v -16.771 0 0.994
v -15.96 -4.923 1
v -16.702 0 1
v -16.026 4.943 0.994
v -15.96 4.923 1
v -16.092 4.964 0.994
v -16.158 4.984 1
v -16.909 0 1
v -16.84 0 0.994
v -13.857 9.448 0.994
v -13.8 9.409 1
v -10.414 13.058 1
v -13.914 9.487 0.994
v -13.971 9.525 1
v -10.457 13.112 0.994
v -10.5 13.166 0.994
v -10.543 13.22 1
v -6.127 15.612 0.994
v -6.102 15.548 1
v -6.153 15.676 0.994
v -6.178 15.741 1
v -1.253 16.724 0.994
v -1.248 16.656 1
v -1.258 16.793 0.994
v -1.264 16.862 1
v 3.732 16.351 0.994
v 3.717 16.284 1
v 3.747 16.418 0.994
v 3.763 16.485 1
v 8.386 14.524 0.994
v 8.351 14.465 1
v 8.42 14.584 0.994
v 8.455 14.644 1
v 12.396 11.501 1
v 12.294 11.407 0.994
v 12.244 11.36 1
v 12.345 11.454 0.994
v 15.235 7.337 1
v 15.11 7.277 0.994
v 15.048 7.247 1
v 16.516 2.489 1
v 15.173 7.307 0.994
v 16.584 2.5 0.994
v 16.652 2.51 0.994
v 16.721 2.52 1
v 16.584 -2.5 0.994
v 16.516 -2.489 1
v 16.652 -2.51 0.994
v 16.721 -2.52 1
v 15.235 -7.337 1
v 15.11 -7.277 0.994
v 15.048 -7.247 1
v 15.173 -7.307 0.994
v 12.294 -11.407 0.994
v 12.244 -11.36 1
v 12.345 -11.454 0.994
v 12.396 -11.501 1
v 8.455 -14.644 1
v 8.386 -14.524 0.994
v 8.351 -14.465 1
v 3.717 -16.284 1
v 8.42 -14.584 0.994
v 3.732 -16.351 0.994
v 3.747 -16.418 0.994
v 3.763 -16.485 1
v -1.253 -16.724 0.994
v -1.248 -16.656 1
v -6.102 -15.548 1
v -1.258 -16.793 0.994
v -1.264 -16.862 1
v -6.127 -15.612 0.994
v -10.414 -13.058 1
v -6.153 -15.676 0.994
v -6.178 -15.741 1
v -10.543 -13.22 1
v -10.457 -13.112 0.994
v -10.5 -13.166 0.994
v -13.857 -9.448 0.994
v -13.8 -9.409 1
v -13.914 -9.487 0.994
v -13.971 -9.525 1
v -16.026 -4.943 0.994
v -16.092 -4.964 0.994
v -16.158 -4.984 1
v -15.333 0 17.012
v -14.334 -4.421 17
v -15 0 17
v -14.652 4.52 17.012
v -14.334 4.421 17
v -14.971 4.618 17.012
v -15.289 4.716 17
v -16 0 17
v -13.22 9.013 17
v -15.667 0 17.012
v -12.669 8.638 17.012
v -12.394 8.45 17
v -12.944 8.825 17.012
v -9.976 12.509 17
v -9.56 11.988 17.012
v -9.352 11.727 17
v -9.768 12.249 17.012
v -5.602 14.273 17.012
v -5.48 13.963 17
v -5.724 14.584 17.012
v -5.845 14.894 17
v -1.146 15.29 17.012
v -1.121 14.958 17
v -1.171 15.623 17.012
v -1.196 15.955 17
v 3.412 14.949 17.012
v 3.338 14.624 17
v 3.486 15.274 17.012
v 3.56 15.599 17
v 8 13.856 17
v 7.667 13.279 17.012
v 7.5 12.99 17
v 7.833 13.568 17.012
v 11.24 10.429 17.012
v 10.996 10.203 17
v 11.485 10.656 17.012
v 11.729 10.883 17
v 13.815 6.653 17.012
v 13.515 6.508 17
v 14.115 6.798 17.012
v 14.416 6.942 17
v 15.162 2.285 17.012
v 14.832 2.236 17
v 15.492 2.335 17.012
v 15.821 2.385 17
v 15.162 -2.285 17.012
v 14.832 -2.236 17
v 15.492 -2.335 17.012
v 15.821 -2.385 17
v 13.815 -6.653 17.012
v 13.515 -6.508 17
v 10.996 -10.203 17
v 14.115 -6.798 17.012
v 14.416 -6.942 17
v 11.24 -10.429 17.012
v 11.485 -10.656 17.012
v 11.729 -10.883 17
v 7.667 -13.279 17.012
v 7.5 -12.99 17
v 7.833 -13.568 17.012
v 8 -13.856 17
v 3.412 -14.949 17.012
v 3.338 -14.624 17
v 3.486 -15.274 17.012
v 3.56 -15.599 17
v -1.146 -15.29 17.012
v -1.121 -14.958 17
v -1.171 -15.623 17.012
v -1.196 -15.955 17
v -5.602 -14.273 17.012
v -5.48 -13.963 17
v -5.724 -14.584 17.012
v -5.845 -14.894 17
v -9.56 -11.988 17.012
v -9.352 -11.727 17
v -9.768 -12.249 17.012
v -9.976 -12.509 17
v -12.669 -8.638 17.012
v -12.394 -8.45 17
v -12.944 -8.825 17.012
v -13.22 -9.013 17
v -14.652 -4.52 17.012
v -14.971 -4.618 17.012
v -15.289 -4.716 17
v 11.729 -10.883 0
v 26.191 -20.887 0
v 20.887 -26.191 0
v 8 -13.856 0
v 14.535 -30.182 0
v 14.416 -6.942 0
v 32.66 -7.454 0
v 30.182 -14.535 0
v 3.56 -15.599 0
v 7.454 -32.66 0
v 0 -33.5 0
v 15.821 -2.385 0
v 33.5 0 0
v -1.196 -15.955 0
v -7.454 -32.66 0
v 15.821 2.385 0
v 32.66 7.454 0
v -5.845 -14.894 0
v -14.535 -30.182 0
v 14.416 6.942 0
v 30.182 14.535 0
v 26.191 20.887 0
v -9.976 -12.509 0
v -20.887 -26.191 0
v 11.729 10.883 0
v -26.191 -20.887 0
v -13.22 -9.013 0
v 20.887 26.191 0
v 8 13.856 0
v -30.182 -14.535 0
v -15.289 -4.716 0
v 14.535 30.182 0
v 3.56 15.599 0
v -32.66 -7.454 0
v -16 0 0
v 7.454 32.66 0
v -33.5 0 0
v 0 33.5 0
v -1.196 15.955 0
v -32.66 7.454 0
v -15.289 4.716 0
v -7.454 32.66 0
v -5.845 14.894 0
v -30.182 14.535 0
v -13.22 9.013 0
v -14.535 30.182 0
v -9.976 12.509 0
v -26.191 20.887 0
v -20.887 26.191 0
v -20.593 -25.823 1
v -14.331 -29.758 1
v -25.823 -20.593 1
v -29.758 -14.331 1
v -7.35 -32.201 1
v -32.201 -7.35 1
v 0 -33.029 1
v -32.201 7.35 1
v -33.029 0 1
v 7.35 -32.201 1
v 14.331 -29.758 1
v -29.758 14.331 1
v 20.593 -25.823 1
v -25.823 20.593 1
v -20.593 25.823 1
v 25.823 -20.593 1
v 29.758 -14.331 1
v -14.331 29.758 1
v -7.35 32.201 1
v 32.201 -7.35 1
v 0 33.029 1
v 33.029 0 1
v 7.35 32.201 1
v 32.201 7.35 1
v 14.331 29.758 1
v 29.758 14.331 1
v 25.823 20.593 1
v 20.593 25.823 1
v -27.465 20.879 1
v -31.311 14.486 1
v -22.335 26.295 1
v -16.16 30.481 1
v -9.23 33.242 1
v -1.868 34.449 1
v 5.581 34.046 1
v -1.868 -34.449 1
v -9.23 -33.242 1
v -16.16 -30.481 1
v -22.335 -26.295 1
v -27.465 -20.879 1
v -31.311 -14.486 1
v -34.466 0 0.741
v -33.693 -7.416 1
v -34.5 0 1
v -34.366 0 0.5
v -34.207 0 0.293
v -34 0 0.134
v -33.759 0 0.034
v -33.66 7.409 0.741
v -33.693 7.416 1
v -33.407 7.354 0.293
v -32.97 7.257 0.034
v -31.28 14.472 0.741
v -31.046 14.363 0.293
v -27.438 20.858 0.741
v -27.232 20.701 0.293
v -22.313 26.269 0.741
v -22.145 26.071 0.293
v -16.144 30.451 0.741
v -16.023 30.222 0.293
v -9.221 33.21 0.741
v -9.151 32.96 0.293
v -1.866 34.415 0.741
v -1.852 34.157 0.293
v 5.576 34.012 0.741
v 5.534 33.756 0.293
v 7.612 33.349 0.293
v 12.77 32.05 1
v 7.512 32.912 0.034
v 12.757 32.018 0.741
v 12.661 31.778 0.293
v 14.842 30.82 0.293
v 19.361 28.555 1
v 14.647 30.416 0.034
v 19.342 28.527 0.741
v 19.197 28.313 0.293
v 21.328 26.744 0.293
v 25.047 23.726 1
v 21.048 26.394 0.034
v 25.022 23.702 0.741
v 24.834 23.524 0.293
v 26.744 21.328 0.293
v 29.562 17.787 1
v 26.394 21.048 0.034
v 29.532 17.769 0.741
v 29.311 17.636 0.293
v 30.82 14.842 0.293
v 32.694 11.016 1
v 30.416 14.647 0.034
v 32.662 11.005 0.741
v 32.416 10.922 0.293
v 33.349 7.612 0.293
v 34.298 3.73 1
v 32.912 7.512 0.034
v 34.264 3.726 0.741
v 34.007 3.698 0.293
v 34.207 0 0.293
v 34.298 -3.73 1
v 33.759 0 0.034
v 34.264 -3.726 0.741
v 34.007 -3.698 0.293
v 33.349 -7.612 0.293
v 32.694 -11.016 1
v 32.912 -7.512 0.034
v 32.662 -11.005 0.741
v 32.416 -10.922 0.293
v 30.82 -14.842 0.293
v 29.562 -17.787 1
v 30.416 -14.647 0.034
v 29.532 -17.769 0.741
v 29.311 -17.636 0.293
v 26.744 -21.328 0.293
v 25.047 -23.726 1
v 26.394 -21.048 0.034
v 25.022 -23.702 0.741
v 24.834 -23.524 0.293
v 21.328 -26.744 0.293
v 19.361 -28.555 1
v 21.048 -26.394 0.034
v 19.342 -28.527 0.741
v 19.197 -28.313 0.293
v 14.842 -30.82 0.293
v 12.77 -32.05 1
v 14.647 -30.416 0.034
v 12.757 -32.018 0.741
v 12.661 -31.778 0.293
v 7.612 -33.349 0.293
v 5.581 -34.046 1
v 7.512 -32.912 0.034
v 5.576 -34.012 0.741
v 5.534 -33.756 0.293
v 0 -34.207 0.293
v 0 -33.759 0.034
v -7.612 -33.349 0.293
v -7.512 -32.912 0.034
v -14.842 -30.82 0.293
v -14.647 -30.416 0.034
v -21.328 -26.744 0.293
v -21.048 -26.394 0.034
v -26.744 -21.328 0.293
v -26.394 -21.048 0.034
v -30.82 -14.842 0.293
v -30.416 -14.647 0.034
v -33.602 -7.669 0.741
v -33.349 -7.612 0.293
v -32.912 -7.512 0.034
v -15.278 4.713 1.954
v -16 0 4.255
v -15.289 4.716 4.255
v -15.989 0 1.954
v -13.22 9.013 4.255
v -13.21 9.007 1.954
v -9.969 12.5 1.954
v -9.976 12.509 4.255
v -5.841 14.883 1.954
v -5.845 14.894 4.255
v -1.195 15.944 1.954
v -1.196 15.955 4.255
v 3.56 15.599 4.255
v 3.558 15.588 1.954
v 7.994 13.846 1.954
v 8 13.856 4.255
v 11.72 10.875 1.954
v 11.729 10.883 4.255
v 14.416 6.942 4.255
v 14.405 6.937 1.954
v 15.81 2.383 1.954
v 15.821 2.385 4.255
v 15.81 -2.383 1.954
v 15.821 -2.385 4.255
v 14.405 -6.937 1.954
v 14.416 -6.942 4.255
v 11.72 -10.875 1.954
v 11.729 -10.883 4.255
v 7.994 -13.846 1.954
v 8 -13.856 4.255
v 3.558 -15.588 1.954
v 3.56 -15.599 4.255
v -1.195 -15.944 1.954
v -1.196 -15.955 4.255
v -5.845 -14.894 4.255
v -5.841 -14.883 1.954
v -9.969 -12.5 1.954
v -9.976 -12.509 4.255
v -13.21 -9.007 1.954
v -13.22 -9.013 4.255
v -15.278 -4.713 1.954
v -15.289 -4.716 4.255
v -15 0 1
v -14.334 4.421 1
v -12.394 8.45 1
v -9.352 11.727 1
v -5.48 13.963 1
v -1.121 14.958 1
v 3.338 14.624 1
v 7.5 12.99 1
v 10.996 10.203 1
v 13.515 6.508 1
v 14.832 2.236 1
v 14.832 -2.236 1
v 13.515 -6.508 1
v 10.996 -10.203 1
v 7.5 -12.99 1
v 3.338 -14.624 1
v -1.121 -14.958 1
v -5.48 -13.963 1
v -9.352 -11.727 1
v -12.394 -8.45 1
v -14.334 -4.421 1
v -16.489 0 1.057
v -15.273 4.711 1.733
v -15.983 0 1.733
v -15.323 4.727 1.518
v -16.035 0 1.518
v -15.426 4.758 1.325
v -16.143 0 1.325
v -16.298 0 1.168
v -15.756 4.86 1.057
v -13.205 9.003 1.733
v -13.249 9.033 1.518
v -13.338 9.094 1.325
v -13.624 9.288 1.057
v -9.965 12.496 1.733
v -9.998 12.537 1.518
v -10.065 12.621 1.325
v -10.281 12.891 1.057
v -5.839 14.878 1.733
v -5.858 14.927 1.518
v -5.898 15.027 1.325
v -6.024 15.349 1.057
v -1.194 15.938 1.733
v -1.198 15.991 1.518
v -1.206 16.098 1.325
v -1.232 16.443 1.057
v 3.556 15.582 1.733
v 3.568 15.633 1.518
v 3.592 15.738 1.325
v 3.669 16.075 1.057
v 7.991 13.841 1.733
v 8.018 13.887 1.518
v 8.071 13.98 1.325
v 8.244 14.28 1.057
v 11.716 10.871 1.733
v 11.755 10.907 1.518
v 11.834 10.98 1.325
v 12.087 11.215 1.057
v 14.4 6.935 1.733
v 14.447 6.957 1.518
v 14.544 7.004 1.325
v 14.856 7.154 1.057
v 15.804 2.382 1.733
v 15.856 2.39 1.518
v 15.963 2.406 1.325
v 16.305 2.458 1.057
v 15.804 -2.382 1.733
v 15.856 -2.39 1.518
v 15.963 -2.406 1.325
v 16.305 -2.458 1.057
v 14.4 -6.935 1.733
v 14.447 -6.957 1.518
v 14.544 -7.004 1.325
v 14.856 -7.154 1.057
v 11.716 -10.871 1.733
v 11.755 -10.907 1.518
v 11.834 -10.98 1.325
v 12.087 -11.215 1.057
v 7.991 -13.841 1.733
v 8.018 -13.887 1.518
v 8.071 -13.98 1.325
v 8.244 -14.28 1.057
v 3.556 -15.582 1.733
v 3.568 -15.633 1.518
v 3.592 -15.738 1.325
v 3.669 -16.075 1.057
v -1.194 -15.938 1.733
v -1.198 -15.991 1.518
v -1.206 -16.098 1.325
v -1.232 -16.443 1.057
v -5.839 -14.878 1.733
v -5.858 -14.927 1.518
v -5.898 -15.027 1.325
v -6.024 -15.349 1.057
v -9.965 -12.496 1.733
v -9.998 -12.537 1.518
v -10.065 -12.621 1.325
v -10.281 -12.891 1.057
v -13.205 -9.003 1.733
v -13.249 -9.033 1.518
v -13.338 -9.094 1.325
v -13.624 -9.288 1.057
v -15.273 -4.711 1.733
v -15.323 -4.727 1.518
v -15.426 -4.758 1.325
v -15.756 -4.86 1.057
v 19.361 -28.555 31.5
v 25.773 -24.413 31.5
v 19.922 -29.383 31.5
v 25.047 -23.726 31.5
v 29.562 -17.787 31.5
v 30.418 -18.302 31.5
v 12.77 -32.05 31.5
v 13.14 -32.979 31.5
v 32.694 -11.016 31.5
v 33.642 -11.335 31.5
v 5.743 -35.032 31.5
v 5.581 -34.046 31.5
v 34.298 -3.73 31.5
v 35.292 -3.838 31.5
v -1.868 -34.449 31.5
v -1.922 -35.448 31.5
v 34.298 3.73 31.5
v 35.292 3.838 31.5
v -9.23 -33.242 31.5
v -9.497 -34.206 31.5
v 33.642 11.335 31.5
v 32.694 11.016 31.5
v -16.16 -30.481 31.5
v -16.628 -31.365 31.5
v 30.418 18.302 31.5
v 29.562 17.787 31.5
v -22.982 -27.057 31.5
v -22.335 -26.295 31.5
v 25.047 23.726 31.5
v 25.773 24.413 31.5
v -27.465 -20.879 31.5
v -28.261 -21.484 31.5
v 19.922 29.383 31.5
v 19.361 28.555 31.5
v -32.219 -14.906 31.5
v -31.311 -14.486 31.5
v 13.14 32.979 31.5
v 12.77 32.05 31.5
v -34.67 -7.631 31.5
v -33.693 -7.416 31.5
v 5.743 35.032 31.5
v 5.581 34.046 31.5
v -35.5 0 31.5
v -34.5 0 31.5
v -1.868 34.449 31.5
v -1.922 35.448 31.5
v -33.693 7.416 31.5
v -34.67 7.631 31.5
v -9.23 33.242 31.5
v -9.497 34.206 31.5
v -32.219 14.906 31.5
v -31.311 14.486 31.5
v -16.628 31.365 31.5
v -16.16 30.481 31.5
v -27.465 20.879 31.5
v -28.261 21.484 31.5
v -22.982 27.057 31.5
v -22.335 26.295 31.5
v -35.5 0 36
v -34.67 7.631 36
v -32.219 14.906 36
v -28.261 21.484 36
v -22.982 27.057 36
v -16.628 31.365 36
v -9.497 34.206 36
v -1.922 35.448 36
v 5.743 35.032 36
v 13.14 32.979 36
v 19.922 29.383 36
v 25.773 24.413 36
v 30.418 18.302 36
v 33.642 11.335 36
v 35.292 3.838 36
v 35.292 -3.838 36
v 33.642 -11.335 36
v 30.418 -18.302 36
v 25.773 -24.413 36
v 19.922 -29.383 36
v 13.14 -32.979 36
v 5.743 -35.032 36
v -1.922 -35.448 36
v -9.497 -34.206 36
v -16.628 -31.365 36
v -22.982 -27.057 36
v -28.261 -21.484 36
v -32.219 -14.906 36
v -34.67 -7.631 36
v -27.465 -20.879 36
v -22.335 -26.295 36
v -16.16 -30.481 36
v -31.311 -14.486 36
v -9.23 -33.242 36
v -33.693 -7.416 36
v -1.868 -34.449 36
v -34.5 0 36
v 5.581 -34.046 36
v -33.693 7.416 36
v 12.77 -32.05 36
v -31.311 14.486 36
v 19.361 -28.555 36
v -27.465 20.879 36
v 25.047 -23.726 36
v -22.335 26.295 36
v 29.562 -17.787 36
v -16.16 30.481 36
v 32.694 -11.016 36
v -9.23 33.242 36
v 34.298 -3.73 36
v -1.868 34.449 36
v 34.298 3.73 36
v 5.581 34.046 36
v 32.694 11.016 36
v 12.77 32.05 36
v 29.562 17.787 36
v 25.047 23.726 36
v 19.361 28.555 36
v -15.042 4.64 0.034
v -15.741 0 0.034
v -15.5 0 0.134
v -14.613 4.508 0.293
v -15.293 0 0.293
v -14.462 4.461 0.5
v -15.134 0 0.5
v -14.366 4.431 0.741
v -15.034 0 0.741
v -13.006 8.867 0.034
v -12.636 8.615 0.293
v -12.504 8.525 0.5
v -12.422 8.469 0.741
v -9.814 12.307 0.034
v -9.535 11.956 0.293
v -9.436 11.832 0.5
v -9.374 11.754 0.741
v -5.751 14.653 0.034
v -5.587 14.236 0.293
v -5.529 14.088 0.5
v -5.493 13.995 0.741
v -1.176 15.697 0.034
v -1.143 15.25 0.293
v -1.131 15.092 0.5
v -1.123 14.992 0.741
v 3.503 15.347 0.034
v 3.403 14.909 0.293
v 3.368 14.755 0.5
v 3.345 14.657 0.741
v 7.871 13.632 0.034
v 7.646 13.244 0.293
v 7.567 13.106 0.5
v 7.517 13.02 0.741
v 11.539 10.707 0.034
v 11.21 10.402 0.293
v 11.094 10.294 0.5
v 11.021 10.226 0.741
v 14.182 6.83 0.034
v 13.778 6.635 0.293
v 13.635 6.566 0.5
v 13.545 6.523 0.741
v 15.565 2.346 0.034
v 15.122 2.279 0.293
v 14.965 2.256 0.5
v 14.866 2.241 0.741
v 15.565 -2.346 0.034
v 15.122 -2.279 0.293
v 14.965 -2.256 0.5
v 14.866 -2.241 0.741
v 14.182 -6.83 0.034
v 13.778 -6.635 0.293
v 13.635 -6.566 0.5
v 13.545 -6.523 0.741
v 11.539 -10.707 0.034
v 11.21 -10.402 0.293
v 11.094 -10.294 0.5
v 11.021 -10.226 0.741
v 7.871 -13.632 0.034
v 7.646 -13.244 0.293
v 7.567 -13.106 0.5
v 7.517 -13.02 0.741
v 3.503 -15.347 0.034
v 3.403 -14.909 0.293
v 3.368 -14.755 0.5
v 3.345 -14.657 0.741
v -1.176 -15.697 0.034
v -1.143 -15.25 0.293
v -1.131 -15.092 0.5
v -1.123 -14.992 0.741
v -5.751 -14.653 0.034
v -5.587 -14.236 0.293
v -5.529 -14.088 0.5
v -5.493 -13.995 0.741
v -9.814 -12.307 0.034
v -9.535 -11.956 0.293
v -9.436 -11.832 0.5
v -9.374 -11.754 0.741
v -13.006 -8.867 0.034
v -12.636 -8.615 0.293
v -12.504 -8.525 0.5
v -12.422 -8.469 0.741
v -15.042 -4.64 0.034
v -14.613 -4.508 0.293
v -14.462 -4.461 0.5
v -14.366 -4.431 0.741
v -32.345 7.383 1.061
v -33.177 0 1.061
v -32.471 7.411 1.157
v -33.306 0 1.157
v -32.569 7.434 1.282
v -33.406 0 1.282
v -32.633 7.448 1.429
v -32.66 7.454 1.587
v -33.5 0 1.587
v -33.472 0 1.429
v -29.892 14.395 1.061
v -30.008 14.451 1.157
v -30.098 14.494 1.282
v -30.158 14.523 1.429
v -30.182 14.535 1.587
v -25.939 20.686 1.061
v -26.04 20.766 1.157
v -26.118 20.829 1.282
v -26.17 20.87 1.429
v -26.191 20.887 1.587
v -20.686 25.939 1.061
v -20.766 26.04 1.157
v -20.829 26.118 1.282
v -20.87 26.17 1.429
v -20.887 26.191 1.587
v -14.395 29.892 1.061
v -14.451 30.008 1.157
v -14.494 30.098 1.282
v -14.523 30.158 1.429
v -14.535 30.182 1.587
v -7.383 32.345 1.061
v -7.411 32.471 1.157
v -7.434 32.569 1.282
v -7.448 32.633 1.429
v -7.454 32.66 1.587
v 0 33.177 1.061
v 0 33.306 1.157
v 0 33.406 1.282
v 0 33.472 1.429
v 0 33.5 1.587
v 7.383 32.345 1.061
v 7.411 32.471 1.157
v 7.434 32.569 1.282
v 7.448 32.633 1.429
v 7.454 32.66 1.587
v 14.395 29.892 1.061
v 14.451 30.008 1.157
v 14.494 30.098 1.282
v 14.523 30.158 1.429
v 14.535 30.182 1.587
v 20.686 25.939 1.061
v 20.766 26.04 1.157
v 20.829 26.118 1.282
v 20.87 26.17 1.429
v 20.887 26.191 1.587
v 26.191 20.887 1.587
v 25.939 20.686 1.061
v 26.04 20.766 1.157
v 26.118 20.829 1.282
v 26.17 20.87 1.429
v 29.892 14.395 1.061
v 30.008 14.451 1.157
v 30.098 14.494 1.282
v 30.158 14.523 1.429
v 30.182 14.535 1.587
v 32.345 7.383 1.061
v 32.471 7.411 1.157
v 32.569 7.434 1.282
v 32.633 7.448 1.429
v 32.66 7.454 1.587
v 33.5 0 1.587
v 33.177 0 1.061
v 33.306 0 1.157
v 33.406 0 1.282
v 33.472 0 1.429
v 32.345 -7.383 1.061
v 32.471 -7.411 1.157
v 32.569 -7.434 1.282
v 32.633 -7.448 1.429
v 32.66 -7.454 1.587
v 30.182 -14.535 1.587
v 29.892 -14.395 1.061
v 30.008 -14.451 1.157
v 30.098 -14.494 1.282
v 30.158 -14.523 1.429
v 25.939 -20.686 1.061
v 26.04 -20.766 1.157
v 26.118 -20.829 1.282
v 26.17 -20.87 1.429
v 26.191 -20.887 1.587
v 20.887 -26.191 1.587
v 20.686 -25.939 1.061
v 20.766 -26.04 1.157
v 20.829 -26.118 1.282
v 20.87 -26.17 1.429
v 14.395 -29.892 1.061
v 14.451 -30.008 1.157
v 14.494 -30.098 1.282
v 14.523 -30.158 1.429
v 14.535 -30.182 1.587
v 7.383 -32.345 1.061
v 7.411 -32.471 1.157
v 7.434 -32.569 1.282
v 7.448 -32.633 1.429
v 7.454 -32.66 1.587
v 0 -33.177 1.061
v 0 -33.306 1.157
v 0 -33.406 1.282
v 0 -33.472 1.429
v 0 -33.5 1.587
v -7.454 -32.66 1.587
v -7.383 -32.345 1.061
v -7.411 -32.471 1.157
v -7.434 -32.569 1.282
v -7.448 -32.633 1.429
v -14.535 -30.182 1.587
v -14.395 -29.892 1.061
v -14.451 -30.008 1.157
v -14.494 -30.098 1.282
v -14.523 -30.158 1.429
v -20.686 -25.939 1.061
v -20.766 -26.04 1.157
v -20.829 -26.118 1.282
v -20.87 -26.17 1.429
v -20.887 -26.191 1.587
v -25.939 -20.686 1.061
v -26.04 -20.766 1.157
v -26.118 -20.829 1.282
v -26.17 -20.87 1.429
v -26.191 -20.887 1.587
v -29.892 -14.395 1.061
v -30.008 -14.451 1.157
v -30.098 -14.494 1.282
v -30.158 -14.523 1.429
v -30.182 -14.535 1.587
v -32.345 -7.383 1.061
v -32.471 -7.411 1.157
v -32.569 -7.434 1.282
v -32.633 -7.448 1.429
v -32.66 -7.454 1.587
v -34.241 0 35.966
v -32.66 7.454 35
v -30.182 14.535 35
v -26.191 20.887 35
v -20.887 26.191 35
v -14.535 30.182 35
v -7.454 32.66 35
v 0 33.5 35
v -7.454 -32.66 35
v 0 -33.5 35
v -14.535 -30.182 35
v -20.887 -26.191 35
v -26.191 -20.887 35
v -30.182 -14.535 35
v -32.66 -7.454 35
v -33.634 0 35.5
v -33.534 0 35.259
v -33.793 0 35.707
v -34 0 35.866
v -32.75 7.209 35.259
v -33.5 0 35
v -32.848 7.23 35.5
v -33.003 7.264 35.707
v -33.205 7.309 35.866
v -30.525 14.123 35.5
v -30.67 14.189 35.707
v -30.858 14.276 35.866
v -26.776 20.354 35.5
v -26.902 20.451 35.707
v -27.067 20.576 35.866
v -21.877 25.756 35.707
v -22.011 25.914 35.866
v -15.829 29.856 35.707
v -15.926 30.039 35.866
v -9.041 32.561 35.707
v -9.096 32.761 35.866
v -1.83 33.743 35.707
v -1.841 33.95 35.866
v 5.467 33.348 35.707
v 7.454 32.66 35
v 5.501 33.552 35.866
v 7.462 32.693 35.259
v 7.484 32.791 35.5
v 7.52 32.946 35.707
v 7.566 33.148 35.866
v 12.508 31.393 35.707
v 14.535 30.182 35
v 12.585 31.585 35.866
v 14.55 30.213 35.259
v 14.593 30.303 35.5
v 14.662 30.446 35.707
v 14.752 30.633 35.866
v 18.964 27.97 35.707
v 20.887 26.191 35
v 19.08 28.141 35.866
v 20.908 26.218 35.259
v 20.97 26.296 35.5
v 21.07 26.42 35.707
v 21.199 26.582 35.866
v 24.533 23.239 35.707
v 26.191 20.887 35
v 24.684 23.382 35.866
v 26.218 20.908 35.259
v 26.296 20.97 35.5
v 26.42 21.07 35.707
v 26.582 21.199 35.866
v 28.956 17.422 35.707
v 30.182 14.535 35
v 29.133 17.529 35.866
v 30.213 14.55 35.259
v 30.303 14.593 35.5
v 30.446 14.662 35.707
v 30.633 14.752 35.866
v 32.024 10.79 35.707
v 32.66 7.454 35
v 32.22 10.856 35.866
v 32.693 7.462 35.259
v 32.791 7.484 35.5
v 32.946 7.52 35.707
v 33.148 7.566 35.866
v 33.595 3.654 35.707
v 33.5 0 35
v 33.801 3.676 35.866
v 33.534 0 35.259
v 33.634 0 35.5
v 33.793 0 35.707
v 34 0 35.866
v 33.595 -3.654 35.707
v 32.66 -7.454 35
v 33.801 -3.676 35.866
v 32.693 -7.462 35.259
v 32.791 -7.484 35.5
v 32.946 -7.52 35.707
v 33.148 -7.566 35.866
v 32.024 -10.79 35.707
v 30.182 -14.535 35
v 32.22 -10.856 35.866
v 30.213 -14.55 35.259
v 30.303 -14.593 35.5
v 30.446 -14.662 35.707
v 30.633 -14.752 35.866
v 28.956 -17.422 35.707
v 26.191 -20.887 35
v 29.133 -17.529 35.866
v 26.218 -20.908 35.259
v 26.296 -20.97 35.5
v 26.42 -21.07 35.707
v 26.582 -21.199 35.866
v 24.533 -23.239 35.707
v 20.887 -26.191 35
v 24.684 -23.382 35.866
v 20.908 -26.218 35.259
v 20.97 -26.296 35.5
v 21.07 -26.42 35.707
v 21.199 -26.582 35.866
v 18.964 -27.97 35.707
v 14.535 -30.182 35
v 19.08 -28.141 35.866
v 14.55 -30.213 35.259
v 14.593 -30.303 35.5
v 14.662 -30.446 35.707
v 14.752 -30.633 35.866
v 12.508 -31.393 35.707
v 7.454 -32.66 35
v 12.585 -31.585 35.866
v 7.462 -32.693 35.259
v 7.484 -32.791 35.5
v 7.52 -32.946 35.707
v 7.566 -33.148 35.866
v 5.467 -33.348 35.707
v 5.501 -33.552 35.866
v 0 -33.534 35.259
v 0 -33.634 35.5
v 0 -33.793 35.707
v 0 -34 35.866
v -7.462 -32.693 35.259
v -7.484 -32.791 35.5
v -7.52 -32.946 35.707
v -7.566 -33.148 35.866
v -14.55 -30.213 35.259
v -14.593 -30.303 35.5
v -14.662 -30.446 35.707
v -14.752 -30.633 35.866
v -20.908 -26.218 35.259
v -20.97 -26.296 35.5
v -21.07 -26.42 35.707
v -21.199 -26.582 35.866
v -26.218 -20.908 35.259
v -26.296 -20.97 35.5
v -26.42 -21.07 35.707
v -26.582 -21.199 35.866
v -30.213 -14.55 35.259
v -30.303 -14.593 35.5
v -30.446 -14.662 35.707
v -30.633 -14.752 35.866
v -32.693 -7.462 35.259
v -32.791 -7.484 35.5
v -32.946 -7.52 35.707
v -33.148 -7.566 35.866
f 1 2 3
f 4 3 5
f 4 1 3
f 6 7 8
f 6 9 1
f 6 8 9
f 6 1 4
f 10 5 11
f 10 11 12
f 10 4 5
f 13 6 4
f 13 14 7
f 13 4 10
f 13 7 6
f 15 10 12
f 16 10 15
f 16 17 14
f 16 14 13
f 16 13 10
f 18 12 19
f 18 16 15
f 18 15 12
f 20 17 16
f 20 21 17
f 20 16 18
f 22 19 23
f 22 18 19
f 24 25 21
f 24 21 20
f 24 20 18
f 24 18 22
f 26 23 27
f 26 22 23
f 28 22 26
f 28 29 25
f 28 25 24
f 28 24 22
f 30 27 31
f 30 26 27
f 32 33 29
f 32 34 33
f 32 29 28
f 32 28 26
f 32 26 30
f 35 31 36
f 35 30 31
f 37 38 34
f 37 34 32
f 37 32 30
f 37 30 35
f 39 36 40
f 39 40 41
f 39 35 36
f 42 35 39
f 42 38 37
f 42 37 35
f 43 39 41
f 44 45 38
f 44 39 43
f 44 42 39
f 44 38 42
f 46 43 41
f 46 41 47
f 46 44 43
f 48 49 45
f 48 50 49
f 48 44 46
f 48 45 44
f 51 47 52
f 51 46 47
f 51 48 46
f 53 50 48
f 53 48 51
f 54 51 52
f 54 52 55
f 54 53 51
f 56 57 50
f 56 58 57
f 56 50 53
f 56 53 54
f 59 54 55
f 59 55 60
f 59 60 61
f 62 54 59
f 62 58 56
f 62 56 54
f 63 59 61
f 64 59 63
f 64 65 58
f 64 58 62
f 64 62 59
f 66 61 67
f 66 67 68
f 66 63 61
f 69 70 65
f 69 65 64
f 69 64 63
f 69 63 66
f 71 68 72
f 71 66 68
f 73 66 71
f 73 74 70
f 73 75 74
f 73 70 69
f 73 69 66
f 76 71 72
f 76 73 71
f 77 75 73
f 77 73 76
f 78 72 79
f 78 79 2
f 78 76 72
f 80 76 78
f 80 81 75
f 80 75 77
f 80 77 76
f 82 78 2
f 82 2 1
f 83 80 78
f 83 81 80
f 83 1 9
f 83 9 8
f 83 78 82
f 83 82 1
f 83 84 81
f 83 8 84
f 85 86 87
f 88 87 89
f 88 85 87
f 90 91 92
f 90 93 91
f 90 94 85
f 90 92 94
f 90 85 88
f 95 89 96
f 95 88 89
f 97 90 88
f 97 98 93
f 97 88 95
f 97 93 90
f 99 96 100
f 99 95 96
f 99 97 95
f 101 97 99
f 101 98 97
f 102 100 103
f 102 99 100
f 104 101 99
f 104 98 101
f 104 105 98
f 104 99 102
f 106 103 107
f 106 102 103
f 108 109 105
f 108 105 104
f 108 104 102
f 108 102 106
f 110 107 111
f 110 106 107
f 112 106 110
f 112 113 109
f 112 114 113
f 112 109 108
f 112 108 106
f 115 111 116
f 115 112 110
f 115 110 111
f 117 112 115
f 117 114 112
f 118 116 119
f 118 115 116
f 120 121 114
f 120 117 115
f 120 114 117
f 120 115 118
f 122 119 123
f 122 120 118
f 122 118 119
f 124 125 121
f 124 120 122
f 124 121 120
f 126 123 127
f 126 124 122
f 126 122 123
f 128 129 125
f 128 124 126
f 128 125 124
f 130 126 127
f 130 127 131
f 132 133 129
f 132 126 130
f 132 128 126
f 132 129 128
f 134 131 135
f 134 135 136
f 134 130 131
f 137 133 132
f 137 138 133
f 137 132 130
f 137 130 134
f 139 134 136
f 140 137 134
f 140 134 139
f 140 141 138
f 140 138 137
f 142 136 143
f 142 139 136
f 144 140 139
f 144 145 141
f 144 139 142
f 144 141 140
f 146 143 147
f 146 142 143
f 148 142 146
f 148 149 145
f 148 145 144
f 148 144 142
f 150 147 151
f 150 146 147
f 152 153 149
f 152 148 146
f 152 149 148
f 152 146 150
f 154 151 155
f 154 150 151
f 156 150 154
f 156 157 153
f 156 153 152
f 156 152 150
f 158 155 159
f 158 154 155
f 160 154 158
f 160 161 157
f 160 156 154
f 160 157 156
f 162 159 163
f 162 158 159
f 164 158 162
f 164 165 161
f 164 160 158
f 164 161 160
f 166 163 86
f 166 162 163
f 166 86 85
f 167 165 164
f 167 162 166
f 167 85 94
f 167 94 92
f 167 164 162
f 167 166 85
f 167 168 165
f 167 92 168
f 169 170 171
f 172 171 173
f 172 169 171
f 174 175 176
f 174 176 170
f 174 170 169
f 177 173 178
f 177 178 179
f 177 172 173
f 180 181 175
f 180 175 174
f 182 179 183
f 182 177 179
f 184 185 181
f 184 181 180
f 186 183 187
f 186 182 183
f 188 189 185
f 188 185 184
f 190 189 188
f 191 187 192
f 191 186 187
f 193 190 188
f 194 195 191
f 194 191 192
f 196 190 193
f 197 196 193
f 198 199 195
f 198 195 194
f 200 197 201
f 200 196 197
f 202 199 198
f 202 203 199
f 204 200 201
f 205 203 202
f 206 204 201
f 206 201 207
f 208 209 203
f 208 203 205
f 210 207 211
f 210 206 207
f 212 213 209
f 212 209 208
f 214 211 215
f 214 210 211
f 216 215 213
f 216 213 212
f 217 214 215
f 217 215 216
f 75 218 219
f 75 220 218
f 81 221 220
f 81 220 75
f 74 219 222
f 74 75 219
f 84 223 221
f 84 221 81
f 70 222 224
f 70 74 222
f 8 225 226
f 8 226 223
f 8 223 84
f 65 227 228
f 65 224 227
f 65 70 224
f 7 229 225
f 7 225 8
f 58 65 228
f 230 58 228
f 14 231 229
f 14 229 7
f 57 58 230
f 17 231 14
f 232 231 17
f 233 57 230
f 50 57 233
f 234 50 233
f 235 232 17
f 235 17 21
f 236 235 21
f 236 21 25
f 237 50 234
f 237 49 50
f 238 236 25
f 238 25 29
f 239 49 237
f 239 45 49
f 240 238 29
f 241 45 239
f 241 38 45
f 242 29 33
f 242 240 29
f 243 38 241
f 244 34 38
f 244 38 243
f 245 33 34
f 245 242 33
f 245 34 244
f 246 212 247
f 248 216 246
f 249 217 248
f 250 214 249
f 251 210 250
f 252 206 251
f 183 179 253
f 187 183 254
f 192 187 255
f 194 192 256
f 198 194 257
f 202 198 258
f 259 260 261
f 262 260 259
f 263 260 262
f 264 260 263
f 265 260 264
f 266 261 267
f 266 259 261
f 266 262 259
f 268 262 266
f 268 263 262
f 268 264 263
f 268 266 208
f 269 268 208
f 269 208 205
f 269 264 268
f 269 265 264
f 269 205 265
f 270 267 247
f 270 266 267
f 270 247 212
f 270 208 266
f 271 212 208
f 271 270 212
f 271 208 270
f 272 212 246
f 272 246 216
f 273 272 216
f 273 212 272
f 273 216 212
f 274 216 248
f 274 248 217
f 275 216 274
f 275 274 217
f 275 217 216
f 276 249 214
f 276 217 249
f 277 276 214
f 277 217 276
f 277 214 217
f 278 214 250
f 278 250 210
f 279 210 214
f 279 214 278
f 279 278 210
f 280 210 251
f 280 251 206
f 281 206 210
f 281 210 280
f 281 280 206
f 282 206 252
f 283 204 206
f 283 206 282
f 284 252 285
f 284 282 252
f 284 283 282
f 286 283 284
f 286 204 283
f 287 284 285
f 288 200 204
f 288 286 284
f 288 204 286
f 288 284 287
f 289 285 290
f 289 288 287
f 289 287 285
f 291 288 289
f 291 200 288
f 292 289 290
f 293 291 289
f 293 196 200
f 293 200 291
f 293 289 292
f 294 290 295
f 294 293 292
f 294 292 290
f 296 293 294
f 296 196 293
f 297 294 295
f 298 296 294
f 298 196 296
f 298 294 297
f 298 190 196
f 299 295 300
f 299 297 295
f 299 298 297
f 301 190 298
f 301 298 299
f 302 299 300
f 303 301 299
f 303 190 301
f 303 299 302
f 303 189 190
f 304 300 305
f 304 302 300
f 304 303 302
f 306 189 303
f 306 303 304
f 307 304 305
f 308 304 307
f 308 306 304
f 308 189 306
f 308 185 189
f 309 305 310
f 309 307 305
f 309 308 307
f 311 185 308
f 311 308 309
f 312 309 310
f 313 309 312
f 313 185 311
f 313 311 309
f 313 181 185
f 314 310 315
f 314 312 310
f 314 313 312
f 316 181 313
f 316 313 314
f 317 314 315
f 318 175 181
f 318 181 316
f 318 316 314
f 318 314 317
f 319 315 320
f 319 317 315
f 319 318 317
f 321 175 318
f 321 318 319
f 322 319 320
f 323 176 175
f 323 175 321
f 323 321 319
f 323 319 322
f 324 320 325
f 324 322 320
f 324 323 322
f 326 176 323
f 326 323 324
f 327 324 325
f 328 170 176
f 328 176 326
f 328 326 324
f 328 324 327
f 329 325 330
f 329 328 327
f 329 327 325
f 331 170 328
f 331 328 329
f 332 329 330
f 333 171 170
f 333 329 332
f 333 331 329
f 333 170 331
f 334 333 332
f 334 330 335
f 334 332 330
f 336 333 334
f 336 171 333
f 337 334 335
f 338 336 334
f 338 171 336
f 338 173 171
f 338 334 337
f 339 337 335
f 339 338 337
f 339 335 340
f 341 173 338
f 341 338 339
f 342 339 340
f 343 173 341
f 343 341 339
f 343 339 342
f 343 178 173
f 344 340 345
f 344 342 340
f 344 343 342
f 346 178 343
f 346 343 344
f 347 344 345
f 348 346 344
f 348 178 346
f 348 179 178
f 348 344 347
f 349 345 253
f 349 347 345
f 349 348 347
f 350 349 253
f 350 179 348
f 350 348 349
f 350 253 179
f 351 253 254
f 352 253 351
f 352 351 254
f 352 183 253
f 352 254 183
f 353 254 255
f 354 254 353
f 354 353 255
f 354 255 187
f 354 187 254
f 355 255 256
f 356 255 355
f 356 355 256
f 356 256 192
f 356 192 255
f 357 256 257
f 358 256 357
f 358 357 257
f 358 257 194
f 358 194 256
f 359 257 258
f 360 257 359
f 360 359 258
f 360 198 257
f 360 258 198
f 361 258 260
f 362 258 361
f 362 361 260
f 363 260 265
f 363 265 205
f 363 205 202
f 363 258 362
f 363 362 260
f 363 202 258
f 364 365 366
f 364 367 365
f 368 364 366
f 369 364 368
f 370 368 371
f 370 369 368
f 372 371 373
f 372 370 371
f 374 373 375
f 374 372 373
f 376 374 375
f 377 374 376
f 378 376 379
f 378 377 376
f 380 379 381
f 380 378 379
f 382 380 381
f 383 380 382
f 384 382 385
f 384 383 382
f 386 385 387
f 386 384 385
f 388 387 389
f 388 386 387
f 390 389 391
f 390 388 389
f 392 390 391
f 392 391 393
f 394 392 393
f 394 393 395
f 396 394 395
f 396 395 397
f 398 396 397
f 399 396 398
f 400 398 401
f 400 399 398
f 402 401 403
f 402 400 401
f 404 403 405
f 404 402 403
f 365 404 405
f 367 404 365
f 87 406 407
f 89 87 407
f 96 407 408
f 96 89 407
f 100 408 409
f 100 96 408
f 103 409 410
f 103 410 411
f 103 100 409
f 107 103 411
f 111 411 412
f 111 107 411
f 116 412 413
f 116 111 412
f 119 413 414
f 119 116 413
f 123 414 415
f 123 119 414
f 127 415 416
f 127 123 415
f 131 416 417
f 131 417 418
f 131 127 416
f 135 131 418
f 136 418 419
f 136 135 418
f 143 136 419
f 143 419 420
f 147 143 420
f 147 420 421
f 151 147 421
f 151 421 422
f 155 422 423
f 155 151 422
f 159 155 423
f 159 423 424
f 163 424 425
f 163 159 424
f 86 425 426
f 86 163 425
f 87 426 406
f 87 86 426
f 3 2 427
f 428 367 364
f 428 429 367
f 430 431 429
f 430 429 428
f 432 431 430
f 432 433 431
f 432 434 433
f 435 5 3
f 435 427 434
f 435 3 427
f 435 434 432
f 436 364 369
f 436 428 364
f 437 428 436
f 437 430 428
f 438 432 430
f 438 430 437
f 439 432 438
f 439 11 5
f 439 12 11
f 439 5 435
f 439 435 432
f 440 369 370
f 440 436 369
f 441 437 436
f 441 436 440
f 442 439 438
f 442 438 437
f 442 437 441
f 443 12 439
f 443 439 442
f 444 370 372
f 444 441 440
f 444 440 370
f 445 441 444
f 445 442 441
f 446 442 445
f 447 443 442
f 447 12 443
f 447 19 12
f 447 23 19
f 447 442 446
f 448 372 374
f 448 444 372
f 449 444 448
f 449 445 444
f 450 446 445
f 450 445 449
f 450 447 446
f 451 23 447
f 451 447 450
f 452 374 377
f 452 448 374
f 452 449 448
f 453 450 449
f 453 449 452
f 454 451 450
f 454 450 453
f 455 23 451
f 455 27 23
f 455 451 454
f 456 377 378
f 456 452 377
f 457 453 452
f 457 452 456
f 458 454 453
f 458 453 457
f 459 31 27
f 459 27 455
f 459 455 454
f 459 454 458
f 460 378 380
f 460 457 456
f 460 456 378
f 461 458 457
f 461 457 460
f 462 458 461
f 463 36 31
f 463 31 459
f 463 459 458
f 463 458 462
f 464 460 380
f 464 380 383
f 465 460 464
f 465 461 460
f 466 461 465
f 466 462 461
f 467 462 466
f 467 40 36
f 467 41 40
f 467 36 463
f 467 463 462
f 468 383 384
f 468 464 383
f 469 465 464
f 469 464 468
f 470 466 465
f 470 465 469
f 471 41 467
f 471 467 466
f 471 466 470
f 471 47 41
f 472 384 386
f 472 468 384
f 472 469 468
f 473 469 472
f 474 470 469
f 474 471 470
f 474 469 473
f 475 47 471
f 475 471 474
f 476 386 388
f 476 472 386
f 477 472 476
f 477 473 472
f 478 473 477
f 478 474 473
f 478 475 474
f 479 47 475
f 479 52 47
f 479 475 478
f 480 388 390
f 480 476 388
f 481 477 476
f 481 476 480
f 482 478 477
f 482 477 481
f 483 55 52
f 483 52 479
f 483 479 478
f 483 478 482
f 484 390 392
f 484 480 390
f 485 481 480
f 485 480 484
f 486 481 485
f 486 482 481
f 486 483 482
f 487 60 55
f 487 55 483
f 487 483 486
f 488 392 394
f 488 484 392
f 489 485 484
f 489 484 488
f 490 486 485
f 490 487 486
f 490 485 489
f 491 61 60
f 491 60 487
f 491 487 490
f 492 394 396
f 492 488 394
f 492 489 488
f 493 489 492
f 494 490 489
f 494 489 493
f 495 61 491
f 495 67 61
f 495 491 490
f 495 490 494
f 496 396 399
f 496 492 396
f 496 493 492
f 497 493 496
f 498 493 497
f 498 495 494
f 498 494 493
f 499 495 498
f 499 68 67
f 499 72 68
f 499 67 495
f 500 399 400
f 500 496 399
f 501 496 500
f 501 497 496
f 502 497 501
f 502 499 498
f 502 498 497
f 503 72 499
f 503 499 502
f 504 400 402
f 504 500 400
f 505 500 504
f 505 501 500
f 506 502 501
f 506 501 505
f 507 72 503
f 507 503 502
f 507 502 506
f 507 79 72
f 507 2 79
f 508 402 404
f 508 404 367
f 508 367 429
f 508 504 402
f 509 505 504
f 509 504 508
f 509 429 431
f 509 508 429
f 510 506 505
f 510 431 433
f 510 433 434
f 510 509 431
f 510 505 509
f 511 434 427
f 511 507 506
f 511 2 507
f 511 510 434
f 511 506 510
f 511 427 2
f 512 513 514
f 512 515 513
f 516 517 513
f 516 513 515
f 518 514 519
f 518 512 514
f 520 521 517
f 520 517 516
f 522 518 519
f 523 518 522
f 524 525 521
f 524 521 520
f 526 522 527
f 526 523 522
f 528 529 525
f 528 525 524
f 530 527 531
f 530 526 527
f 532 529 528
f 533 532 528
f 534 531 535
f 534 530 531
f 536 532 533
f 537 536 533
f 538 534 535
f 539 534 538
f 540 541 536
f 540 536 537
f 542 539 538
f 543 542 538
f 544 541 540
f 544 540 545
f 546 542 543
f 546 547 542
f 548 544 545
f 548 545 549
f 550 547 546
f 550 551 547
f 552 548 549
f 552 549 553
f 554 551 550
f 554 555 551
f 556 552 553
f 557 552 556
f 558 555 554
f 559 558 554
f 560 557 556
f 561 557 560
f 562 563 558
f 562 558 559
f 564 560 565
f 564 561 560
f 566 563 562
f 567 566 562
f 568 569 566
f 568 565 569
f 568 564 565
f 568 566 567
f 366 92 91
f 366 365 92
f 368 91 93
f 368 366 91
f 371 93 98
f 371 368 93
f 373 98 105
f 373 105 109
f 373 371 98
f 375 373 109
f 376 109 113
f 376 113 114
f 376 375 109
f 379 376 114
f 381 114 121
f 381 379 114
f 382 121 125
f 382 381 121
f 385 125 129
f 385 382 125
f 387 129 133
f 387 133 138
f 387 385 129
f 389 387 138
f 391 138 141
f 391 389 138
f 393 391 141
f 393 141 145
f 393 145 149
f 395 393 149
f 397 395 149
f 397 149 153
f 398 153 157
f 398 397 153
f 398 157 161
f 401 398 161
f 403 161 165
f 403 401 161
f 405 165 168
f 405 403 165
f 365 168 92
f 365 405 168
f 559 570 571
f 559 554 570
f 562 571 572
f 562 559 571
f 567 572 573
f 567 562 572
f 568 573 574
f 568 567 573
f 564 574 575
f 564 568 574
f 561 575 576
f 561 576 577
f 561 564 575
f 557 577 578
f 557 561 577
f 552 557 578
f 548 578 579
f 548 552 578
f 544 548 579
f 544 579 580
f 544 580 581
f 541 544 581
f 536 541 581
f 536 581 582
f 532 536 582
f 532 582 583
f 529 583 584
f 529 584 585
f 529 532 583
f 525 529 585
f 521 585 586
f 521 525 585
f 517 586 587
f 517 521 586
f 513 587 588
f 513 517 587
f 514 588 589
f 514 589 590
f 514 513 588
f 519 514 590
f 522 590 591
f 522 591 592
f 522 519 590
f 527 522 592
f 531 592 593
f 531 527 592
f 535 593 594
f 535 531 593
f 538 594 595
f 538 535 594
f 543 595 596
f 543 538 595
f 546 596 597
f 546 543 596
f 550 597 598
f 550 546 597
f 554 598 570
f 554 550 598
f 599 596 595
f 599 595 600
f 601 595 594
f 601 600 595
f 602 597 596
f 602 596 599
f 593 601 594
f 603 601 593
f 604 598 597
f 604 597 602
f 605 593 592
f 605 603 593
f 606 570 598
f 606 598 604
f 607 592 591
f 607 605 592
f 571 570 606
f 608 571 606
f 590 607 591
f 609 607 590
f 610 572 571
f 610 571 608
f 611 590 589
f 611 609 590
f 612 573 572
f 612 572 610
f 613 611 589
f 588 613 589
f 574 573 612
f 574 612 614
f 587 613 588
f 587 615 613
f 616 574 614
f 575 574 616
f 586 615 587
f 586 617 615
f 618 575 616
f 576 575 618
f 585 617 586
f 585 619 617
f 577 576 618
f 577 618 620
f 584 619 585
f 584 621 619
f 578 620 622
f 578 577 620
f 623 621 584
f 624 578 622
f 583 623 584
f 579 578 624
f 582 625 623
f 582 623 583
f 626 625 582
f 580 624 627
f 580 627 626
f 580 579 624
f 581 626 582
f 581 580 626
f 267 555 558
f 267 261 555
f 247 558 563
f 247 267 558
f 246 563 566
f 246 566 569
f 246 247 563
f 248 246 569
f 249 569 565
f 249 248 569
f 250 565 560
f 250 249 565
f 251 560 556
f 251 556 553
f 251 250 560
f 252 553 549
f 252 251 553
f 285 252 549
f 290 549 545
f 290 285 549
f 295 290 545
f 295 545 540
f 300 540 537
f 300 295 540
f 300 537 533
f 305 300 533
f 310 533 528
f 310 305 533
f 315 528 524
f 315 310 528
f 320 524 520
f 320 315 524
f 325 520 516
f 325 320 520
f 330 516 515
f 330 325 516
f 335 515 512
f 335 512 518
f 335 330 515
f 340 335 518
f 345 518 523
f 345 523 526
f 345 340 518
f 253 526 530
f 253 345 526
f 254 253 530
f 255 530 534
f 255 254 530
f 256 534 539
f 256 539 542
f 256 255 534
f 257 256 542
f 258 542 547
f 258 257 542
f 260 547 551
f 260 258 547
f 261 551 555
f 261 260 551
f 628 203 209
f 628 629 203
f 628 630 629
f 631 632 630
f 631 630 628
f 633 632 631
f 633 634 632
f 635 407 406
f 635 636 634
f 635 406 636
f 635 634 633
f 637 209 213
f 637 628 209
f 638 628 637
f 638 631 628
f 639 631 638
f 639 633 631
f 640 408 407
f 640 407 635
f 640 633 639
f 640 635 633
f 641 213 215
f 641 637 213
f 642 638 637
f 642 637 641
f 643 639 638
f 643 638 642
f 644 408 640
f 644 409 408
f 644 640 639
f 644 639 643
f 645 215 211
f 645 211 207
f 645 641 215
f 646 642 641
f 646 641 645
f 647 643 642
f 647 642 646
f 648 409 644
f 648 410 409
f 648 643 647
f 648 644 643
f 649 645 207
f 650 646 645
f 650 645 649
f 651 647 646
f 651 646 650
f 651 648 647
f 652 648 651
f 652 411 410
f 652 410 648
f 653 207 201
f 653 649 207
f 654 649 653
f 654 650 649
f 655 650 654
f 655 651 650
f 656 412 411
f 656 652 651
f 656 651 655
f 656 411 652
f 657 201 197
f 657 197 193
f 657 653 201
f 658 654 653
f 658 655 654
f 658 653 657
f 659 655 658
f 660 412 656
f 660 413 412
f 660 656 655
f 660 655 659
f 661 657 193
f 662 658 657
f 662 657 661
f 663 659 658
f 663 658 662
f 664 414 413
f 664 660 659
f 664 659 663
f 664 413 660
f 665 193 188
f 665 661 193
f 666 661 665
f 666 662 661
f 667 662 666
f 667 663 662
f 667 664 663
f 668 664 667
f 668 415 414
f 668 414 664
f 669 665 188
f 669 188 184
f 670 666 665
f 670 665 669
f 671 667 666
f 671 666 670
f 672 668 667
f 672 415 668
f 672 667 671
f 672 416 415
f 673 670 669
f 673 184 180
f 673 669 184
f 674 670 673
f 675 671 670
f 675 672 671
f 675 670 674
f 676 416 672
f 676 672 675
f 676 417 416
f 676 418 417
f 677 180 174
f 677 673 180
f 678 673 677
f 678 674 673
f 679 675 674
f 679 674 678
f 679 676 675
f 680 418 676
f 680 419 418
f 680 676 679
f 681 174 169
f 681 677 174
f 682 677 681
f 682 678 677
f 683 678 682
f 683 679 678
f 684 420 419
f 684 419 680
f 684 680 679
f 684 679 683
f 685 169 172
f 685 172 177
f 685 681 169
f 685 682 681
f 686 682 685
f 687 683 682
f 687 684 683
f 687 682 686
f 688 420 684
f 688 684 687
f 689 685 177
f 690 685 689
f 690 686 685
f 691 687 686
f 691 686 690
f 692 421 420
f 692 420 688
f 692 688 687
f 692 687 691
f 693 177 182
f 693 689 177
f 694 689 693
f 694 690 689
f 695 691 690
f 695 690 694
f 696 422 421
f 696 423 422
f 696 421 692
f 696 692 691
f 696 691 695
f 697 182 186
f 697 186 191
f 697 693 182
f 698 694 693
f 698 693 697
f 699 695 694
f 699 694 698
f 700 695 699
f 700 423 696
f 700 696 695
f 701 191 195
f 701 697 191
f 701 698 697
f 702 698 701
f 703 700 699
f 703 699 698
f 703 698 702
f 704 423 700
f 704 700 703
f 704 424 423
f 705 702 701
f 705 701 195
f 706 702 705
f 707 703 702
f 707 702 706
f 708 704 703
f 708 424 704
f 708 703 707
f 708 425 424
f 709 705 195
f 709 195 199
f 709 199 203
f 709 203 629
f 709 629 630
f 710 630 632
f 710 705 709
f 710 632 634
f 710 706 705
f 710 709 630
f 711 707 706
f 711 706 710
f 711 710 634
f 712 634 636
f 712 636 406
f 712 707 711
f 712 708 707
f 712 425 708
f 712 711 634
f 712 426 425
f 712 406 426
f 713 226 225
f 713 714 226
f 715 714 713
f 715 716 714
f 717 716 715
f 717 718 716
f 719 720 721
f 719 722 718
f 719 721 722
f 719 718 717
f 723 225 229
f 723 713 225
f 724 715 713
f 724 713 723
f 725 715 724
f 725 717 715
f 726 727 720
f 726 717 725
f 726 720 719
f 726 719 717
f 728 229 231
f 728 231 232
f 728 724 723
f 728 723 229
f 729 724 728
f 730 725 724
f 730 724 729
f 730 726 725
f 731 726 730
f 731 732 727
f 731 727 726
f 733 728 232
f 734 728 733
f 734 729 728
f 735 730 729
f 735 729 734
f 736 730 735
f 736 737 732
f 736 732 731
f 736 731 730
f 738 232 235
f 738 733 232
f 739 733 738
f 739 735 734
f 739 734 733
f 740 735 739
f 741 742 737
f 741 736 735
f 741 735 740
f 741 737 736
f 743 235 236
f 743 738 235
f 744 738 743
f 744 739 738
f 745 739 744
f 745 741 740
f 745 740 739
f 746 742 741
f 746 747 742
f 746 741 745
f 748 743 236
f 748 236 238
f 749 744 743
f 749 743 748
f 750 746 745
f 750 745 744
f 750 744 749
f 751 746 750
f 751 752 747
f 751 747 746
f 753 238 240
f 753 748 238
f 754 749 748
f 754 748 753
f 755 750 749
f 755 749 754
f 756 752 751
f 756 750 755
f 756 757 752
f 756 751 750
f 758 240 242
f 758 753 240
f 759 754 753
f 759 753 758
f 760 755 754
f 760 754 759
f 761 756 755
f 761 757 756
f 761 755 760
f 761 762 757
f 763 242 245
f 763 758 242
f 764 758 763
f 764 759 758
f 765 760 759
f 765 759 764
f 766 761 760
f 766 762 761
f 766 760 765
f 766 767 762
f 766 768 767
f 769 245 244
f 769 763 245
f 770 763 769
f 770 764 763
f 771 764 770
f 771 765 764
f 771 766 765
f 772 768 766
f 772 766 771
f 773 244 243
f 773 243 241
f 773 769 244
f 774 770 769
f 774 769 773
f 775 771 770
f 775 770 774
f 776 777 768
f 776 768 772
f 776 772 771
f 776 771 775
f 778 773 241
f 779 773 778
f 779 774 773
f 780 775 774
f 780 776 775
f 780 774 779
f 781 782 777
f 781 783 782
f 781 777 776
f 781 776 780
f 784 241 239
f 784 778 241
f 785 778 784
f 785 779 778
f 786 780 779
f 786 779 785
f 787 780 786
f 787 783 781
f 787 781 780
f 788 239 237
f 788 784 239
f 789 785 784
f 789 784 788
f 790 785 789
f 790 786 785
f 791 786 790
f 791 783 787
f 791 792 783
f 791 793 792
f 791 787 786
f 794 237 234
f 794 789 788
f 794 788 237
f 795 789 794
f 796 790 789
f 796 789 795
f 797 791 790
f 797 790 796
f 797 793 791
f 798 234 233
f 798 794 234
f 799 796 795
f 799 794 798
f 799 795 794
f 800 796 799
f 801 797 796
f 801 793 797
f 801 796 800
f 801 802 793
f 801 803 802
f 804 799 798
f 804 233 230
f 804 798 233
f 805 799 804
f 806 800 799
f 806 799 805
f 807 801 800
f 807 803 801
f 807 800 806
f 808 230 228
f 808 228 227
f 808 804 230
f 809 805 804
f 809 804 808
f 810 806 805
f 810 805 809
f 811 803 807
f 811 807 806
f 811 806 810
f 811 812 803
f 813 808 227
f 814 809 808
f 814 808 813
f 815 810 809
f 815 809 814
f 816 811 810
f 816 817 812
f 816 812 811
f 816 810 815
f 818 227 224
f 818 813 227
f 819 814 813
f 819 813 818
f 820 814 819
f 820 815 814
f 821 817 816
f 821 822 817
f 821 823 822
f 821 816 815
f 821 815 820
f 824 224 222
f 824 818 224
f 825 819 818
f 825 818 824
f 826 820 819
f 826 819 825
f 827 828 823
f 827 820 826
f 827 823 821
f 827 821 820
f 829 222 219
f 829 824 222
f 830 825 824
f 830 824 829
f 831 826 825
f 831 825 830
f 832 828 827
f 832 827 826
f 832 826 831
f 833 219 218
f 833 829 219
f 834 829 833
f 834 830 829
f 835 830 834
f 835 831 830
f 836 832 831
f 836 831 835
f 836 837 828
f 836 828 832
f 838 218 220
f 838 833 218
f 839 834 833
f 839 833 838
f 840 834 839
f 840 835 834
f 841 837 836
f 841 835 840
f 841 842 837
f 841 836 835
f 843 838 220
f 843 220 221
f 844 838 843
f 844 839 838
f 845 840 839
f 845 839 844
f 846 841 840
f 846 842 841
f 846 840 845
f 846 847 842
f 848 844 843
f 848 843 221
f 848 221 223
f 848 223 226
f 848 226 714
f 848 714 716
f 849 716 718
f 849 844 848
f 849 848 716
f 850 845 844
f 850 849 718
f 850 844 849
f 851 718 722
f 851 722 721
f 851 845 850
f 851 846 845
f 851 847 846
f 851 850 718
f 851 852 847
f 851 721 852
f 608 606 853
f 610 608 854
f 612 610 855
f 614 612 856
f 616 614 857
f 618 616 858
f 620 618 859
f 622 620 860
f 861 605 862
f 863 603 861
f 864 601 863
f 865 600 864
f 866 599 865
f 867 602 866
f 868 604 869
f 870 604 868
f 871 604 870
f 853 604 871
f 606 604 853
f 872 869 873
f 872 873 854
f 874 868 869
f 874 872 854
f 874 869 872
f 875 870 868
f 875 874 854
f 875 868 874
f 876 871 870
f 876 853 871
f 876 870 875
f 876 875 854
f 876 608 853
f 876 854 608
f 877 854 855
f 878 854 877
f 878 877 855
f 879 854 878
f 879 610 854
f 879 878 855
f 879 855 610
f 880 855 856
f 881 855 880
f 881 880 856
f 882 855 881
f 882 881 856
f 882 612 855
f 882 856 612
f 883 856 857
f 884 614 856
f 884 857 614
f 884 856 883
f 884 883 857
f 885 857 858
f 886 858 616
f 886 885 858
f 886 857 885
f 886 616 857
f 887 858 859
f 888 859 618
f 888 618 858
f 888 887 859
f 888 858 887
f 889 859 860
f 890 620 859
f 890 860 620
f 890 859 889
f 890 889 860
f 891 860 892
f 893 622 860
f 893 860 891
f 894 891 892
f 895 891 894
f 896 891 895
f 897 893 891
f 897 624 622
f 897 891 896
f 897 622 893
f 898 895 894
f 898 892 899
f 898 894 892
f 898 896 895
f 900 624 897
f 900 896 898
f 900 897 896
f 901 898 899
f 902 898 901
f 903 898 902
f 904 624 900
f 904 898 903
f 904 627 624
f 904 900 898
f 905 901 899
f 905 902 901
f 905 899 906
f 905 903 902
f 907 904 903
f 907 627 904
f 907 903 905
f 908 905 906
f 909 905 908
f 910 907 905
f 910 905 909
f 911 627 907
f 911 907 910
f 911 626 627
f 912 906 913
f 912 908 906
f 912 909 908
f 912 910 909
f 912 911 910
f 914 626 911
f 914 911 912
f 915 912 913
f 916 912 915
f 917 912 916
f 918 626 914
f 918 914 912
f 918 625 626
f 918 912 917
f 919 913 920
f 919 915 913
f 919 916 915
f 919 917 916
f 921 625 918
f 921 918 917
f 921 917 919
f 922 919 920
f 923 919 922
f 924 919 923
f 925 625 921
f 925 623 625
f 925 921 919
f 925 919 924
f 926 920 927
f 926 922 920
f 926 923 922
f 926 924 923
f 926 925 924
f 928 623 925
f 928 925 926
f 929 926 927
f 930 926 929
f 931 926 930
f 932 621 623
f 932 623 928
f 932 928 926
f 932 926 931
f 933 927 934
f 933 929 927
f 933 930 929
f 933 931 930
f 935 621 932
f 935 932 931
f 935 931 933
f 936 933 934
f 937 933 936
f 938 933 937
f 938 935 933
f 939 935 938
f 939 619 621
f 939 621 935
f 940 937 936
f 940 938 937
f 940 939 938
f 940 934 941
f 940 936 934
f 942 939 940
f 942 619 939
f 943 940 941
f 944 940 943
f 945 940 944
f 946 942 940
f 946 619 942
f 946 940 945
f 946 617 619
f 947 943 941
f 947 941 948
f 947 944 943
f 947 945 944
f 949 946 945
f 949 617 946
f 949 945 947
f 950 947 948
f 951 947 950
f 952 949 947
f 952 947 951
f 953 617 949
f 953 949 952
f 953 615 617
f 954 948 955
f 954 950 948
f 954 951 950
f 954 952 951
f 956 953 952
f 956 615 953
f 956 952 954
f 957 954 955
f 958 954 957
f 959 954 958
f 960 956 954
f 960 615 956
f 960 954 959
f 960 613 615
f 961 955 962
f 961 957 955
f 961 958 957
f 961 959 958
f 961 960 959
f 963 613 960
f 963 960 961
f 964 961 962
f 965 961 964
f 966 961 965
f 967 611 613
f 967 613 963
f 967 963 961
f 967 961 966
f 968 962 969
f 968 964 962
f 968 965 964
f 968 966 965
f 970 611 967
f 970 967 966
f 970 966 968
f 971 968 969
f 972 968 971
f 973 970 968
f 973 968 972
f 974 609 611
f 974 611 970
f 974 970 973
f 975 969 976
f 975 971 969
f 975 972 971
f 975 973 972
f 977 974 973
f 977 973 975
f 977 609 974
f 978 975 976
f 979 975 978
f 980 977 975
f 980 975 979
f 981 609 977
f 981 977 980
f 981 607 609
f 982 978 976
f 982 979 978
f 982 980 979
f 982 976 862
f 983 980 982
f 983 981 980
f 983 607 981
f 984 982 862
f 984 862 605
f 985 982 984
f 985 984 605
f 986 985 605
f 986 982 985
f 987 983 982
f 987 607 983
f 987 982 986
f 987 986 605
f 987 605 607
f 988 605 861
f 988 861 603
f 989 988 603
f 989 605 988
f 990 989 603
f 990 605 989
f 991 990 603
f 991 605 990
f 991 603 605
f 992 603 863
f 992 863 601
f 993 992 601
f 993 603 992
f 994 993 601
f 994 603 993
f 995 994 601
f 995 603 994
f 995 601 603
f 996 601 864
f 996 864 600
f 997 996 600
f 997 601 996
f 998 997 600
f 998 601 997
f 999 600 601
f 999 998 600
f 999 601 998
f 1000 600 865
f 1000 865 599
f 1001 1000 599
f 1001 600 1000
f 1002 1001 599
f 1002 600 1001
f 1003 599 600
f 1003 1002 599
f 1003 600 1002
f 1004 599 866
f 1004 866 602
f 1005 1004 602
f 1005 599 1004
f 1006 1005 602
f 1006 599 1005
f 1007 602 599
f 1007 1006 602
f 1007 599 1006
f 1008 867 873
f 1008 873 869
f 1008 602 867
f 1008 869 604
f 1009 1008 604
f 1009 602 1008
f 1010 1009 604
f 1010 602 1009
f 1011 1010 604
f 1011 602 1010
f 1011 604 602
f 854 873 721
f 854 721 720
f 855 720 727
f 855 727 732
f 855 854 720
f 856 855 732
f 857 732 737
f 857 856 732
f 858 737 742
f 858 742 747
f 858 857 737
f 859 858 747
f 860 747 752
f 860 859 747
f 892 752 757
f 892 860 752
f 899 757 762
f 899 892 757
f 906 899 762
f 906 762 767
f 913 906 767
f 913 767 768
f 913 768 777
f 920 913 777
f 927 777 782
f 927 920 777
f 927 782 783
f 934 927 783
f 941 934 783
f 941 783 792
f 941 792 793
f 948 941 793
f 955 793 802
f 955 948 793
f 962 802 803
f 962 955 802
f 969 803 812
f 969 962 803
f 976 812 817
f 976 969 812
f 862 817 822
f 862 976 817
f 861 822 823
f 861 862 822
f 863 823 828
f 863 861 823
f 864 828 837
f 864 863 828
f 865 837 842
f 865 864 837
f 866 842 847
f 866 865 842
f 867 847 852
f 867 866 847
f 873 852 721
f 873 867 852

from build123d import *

# Parameters (mm, degrees)
F2_R = 1


with BuildPart() as f1:
    # F0 (on Front) → F1 (revolve)
    with BuildSketch(Plane.XZ):
        with BuildLine():
            Line((-33.5, 0), (-16, 0))
            ThreePointArc((-16, 0), (-15.292893, 0.292893), (-15, 1))
            Line((-15, 1), (-15, 17))
            ThreePointArc((-15, 17), (-15.5, 17.013149), (-16, 17))
            Line((-16, 17), (-16, 4.255122))
            Line((-16, 4.255122), (-15.988545, 1.953905))
            ThreePointArc((-15.988545, 1.953905), (-16.142937, 1.325431), (-16.702322, 1))
            ThreePointArc((-16.702322, 1), (-16.805884, 0.993498), (-16.909445, 1))
            Line((-16.909445, 1), (-33.028781, 1))
            ThreePointArc((-33.028781, 1), (-33.360033, 1.216641), (-33.5, 1.586872))
            Line((-33.5, 1.586872), (-33.5, 36))
            Line((-33.5, 36), (-35.5, 36))
            Line((-35.5, 36), (-35.5, 31.5))
            Line((-35.5, 31.5), (-34.5, 31.5))
            Line((-34.5, 31.5), (-34.5, 1))
            ThreePointArc((-34.5, 1), (-34.207107, 0.292893), (-33.5, 0))
        make_face()
    revolve(axis=Axis((0, 0, 10.195818), (0, 0, -1)))

    # F2
    f2_edges = [f1.edges().sort_by_distance(p)[0] for p in [
        (33.5, 0, 36),
    ]]
    fillet(f2_edges, radius=F2_R)


solid = f1.part
